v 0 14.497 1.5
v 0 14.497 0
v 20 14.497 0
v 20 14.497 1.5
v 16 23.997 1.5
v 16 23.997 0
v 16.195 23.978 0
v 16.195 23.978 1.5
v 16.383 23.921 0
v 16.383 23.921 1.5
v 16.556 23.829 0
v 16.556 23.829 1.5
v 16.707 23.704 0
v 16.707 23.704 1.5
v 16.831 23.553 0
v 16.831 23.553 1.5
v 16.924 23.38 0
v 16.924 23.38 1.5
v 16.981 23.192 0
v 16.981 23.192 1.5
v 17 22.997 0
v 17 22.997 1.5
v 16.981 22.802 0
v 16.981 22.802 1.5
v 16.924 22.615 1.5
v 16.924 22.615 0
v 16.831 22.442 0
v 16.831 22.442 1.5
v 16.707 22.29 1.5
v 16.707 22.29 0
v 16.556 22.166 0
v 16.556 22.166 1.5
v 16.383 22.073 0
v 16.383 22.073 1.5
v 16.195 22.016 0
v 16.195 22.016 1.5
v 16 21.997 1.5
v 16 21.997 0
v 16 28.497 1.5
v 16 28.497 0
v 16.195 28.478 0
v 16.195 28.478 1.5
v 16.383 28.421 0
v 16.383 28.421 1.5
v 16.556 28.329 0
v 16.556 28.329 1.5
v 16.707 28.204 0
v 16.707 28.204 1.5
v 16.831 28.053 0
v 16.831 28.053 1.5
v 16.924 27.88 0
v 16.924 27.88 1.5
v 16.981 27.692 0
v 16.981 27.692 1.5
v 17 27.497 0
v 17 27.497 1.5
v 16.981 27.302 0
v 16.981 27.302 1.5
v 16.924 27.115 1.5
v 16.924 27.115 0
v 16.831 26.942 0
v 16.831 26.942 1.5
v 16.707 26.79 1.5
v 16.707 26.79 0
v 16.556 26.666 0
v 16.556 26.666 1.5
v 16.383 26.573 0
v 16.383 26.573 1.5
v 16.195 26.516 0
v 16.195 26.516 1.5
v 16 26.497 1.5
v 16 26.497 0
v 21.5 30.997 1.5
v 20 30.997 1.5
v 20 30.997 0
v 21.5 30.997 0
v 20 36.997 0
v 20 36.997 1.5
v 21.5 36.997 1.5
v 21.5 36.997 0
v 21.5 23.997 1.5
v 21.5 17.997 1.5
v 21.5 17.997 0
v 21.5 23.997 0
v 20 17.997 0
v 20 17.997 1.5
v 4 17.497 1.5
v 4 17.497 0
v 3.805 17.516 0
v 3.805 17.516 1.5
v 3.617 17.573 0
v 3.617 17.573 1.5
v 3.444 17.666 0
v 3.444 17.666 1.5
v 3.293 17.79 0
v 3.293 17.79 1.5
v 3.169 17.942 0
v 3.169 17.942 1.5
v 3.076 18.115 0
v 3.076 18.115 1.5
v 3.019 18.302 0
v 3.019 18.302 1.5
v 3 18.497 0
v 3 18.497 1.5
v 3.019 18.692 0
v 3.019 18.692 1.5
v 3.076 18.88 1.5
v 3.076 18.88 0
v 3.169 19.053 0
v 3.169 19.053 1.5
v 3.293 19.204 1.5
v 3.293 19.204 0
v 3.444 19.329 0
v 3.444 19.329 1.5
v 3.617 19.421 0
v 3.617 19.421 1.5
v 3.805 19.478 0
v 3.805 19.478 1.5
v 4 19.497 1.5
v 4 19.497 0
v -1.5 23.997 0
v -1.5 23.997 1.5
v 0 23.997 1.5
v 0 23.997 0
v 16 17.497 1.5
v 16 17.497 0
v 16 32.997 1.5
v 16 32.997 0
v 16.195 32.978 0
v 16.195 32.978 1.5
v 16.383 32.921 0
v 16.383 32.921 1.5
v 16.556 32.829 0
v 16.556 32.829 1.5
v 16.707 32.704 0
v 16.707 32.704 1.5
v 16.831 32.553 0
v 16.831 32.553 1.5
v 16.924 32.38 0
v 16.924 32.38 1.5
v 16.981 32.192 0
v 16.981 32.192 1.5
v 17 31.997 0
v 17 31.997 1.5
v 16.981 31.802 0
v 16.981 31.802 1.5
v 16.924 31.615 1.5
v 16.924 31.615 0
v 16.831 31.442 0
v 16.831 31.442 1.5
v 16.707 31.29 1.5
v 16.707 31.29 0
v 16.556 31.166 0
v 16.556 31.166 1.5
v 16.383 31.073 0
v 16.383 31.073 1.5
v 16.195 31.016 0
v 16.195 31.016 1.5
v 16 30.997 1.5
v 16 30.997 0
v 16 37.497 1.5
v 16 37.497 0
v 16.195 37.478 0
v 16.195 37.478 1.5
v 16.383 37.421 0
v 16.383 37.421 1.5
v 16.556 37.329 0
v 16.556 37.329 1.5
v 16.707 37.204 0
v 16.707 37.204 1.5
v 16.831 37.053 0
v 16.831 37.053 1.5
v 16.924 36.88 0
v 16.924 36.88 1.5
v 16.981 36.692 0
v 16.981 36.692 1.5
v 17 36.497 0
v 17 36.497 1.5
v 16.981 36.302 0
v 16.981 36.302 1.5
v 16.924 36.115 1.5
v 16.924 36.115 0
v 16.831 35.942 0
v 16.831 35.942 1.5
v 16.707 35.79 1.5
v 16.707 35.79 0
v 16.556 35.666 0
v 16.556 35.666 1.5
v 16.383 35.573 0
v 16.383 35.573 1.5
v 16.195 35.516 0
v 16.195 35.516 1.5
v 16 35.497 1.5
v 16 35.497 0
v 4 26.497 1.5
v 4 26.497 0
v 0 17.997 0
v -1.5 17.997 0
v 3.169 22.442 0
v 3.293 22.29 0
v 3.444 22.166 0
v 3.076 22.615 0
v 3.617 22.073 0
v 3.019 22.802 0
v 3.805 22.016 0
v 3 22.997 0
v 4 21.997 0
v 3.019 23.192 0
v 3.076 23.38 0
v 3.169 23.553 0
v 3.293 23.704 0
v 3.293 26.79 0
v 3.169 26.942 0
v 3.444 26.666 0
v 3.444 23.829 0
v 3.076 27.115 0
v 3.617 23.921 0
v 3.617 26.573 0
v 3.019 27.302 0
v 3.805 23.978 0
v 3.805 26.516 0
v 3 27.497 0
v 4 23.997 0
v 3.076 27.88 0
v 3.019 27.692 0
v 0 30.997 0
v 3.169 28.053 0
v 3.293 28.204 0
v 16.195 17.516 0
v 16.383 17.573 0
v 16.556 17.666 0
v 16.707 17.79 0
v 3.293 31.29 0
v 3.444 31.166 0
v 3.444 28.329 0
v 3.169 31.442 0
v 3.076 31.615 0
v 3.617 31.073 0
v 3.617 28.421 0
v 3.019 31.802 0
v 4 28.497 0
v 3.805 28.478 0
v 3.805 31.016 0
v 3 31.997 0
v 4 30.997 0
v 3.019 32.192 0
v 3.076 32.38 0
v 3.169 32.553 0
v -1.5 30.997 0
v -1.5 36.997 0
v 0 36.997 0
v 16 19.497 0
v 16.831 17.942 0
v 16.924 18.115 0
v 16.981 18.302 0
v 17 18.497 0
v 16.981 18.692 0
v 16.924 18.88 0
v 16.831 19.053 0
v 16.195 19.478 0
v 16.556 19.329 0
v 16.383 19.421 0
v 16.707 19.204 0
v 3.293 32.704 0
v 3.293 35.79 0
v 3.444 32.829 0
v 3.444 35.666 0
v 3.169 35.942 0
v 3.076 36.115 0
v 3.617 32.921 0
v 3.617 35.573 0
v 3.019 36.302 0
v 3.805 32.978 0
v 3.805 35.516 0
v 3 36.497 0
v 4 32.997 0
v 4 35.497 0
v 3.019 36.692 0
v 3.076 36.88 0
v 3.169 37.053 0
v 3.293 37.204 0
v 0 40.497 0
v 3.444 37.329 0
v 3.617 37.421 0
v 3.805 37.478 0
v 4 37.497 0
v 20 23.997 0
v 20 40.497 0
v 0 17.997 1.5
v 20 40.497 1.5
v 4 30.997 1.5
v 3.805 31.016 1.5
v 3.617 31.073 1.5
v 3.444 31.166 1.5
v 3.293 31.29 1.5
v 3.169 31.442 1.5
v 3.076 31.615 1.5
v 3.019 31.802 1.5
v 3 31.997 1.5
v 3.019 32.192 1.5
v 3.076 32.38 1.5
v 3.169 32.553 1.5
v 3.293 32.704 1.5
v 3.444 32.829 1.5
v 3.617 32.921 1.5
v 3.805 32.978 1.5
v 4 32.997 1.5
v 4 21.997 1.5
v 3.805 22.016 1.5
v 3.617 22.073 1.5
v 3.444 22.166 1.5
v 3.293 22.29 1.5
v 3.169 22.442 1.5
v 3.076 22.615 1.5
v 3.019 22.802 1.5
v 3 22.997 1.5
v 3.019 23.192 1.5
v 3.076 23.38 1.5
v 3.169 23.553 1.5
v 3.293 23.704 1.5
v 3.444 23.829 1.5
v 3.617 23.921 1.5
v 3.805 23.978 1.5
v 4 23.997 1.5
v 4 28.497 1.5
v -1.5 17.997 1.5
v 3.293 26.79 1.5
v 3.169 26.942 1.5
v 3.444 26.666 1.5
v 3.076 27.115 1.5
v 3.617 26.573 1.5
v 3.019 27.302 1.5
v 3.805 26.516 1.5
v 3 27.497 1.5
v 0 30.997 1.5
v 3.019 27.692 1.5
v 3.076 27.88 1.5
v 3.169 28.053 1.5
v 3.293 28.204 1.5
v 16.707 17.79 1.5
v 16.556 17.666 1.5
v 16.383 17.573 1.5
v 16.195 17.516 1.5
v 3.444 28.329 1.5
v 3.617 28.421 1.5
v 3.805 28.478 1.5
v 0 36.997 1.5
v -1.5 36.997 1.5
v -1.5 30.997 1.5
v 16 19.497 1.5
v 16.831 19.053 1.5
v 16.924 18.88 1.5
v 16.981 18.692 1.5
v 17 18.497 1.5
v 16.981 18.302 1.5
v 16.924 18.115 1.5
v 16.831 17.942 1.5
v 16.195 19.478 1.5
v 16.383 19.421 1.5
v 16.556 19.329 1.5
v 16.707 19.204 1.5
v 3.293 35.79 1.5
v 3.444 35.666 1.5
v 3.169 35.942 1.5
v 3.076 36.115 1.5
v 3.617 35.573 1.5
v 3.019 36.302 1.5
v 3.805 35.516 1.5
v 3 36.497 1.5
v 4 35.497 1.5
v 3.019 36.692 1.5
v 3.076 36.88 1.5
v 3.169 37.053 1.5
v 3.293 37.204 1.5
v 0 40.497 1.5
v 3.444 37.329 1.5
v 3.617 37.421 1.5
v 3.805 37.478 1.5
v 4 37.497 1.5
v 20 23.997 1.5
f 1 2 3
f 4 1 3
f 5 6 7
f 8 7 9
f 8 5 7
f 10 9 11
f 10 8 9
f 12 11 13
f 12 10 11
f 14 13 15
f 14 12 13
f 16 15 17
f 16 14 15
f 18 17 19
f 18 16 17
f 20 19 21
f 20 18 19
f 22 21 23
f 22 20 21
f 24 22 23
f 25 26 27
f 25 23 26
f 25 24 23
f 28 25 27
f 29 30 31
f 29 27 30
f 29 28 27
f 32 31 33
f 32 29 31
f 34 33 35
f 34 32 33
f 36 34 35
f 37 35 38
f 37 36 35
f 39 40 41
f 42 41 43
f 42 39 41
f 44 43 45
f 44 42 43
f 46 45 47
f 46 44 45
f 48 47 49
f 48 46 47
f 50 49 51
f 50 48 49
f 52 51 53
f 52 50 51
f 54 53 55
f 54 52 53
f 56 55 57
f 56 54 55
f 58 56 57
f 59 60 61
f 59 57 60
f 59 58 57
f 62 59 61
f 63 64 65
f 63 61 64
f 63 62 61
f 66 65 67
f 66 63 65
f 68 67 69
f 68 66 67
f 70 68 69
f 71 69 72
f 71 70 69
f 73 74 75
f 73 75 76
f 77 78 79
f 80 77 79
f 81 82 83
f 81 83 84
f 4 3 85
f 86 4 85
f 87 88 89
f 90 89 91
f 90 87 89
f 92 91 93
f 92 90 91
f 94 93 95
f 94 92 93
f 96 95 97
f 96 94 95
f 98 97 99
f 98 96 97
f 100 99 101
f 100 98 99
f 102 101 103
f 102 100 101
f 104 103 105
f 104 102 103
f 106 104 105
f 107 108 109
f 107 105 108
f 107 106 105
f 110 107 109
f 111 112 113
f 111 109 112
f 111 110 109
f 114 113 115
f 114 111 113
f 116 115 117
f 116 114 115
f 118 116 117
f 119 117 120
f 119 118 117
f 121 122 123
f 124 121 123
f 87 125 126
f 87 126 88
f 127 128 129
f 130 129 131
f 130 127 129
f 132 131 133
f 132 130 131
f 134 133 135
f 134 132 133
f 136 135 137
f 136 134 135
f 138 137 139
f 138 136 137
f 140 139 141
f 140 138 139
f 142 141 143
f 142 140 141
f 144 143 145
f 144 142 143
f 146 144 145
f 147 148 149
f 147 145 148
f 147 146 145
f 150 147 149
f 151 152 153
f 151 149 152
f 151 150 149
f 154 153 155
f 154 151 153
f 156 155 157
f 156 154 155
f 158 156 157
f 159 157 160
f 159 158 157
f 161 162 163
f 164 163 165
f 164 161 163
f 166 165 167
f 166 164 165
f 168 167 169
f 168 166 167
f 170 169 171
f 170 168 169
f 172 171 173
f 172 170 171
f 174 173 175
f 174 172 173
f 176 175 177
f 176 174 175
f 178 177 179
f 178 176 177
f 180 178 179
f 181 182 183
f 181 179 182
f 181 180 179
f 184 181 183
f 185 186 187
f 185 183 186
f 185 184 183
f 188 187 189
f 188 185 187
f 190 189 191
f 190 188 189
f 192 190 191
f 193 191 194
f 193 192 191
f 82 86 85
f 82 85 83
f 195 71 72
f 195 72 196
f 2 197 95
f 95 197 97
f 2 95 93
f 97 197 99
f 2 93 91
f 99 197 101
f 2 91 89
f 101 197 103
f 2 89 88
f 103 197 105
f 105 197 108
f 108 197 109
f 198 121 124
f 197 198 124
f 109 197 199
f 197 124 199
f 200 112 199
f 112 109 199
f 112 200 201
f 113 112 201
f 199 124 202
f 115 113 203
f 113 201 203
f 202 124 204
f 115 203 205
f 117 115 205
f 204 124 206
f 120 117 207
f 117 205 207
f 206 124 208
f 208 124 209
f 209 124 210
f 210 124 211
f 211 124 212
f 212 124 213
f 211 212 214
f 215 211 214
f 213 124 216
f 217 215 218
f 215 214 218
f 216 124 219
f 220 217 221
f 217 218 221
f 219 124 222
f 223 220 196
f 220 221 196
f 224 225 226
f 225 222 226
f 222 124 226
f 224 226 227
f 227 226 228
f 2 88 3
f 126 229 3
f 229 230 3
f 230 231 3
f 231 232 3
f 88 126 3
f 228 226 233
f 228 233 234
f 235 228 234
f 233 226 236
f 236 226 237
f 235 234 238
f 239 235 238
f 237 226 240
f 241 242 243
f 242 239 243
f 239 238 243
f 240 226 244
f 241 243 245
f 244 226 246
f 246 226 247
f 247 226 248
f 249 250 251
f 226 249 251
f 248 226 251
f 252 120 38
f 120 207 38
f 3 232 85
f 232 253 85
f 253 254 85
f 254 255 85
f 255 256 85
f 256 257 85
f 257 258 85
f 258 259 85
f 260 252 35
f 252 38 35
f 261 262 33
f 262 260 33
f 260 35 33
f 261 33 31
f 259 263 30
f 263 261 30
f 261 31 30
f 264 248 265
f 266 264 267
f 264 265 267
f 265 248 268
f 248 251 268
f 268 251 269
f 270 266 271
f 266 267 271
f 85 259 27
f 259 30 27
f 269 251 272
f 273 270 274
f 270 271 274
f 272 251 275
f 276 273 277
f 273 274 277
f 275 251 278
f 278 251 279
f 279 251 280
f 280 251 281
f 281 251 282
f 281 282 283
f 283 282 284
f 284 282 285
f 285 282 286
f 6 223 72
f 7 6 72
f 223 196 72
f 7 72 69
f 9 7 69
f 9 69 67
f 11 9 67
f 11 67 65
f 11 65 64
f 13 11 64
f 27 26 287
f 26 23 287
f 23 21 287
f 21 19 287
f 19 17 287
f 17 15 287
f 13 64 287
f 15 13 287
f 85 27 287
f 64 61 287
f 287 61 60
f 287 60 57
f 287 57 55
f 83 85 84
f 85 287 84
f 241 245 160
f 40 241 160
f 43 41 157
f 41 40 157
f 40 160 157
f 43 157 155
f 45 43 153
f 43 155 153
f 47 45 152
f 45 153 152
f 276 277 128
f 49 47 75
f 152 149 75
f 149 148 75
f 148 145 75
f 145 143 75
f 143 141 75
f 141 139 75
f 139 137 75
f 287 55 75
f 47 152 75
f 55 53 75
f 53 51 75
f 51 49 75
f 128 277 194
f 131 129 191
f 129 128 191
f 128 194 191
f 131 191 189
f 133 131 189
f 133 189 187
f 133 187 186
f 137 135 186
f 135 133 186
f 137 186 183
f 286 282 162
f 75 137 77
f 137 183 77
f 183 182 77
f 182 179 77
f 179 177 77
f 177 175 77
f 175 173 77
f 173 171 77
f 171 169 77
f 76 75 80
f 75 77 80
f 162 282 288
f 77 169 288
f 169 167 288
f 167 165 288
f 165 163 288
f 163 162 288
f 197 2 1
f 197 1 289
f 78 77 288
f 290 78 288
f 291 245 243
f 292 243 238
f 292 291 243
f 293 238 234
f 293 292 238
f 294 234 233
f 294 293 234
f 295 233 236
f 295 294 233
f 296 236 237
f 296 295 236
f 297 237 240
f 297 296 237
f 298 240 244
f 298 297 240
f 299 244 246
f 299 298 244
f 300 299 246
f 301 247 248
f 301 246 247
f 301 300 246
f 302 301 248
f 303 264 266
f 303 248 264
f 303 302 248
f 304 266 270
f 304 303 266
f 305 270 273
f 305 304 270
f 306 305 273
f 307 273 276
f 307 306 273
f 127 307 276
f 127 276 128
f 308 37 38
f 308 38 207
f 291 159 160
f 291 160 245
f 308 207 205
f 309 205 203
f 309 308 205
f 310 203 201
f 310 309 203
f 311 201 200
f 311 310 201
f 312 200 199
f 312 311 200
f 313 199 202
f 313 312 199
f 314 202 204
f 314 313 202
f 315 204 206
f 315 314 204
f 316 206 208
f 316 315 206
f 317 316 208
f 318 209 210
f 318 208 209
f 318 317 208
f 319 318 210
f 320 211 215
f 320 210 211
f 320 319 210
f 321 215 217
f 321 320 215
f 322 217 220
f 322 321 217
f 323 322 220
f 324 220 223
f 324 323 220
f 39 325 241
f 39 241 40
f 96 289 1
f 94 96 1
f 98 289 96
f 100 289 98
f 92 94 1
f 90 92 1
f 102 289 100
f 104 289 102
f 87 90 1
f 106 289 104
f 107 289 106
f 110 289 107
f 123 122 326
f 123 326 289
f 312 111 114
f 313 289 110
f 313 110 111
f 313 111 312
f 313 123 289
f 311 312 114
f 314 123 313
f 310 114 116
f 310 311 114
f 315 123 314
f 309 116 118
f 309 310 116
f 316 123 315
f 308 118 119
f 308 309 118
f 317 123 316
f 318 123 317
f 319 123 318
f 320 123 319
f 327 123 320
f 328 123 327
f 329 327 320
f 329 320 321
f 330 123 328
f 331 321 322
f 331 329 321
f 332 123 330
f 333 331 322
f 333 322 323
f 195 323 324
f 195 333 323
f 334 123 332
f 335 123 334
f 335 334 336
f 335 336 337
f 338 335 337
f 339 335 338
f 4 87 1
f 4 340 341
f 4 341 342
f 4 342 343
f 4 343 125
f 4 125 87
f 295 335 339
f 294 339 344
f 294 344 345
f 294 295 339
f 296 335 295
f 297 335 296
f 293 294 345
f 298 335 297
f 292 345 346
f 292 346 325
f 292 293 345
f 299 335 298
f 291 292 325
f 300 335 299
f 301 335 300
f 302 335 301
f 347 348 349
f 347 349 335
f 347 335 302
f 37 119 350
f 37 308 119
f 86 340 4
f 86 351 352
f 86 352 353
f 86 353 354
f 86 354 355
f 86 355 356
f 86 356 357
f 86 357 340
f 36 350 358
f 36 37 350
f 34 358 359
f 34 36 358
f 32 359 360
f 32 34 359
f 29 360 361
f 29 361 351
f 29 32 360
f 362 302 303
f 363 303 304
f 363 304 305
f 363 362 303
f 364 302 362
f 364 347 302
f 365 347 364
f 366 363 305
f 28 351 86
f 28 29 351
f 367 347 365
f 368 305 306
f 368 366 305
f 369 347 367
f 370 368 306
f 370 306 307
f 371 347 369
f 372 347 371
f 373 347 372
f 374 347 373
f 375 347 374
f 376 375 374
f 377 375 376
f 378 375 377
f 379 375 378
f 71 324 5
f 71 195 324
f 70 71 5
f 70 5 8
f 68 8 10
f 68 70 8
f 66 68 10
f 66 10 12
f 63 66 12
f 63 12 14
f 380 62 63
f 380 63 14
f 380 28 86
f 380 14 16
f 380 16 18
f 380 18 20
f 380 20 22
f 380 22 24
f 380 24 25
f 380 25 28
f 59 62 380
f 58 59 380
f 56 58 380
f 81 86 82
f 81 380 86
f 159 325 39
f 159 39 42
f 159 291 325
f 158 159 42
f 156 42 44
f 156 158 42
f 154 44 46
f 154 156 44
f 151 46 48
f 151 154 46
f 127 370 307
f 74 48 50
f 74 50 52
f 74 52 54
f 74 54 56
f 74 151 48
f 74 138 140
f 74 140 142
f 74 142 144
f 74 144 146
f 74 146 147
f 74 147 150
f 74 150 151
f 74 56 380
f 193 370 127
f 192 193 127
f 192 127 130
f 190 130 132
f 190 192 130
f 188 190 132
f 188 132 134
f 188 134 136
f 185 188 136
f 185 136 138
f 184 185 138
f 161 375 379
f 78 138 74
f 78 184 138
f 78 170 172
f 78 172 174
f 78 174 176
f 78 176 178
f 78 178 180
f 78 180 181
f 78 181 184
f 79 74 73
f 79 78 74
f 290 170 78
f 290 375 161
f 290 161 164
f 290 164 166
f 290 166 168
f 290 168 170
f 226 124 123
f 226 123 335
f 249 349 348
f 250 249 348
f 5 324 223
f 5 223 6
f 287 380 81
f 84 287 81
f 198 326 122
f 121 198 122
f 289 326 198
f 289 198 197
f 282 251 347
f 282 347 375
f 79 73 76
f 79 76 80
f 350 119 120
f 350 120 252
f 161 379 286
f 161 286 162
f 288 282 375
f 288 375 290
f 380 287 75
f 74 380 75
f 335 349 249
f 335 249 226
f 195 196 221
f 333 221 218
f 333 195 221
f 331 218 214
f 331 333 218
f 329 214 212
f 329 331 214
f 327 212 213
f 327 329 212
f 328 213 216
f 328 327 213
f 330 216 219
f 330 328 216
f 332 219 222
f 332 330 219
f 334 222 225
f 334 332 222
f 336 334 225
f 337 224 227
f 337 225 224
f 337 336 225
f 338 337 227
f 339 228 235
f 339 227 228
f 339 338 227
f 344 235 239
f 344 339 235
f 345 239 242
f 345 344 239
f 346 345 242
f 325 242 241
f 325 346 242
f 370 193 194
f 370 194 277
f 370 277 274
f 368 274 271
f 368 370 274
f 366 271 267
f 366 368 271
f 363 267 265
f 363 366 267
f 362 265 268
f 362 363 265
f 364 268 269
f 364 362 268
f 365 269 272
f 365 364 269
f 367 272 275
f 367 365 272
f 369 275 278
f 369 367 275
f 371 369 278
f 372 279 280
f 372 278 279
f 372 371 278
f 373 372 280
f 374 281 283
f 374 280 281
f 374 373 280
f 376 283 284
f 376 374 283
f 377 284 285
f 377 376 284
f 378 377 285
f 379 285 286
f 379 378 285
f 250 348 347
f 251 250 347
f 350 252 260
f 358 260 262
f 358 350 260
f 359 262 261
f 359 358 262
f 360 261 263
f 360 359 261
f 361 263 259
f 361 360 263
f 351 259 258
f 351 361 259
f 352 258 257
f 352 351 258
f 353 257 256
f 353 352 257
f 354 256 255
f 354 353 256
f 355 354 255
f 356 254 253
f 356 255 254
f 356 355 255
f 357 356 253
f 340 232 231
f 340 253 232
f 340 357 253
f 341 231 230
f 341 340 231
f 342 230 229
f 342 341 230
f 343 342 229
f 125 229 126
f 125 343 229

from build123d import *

# Parameters (mm, degrees)
SKETCH1_W        = 20
SKETCH1_H        = 26
BASE_DEPTH       = 1.5
SKETCH3_W        = 1.5
SKETCH3_H        = 6
MOUNT_EARS_DEPTH = 1.5
RIBS_REACH       = 47.875


with BuildPart() as part:
    # Sketch1 → Base (new body)
    with BuildSketch(Plane.XY):
        with Locations((10, 27.497191913)):
            Rectangle(SKETCH1_W, SKETCH1_H)
    extrude(amount=BASE_DEPTH)

    # Sketch3 → Mount ears (add)
    with BuildSketch(Plane.XY.offset(1.5)):
        with Locations((-0.75, 33.997191913)):
            Rectangle(SKETCH3_W, SKETCH3_H)
        with Locations((20.75, 33.997191913)):
            Rectangle(SKETCH3_W, SKETCH3_H)
        with Locations((20.75, 20.997191913)):
            Rectangle(SKETCH3_W, SKETCH3_H)
        with Locations((-0.75, 20.997191913)):
            Rectangle(SKETCH3_W, SKETCH3_H)
    extrude(amount=-MOUNT_EARS_DEPTH)

    # Sketch5 → Ribs (cut, up to next)
    with BuildSketch(Plane.XY.offset(1.5), mode=Mode.PRIVATE) as ribs_sk1:
        with BuildLine():
            Line((4, 37.497191913), (16, 37.497191913))
            ThreePointArc((16, 37.497191913), (17, 36.497191913), (16, 35.497191913))
            Line((16, 35.497191913), (4, 35.497191913))
            ThreePointArc((4, 35.497191913), (3, 36.497191913), (4, 37.497191913))
        make_face()
    ribs_tool1 = extrude(ribs_sk1.sketch, amount=-RIBS_REACH, mode=Mode.PRIVATE) & part.part
    # Sketch5 → Ribs (cut, up to next)
    with BuildSketch(Plane.XY.offset(1.5), mode=Mode.PRIVATE) as ribs_sk2:
        with BuildLine():
            Line((4, 32.997191913), (16, 32.997191913))
            ThreePointArc((16, 32.997191913), (17, 31.997191913), (16, 30.997191913))
            Line((16, 30.997191913), (4, 30.997191913))
            ThreePointArc((4, 30.997191913), (3, 31.997191913), (4, 32.997191913))
        make_face()
    ribs_tool2 = extrude(ribs_sk2.sketch, amount=-RIBS_REACH, mode=Mode.PRIVATE) & part.part
    # Sketch5 → Ribs (cut, up to next)
    with BuildSketch(Plane.XY.offset(1.5), mode=Mode.PRIVATE) as ribs_sk3:
        with BuildLine():
            Line((4, 28.497191913), (16, 28.497191913))
            ThreePointArc((16, 28.497191913), (17, 27.497191913), (16, 26.497191913))
            Line((16, 26.497191913), (4, 26.497191913))
            ThreePointArc((4, 26.497191913), (3, 27.497191913), (4, 28.497191913))
        make_face()
    ribs_tool3 = extrude(ribs_sk3.sketch, amount=-RIBS_REACH, mode=Mode.PRIVATE) & part.part
    # Sketch5 → Ribs (cut, up to next)
    with BuildSketch(Plane.XY.offset(1.5), mode=Mode.PRIVATE) as ribs_sk4:
        with BuildLine():
            Line((4, 23.997191913), (16, 23.997191913))
            ThreePointArc((16, 23.997191913), (17, 22.997191913), (16, 21.997191913))
            Line((16, 21.997191913), (4, 21.997191913))
            ThreePointArc((4, 21.997191913), (3, 22.997191913), (4, 23.997191913))
        make_face()
    ribs_tool4 = extrude(ribs_sk4.sketch, amount=-RIBS_REACH, mode=Mode.PRIVATE) & part.part
    # Sketch5 → Ribs (cut, up to next)
    with BuildSketch(Plane.XY.offset(1.5), mode=Mode.PRIVATE) as ribs_sk5:
        with BuildLine():
            Line((4, 19.497191913), (16, 19.497191913))
            ThreePointArc((16, 19.497191913), (17, 18.497191913), (16, 17.497191913))
            Line((16, 17.497191913), (4, 17.497191913))
            ThreePointArc((4, 17.497191913), (3, 18.497191913), (4, 19.497191913))
        make_face()
    ribs_tool5 = extrude(ribs_sk5.sketch, amount=-RIBS_REACH, mode=Mode.PRIVATE) & part.part
    add(ribs_tool1.solids().sort_by_distance((10, 36.497192, 1.5))[0], mode=Mode.SUBTRACT)
    add(ribs_tool2.solids().sort_by_distance((10, 31.997192, 1.5))[0], mode=Mode.SUBTRACT)
    add(ribs_tool3.solids().sort_by_distance((10, 27.497192, 1.5))[0], mode=Mode.SUBTRACT)
    add(ribs_tool4.solids().sort_by_distance((10, 22.997192, 1.5))[0], mode=Mode.SUBTRACT)
    add(ribs_tool5.solids().sort_by_distance((10, 18.497192, 1.5))[0], mode=Mode.SUBTRACT)


solid = part.part
